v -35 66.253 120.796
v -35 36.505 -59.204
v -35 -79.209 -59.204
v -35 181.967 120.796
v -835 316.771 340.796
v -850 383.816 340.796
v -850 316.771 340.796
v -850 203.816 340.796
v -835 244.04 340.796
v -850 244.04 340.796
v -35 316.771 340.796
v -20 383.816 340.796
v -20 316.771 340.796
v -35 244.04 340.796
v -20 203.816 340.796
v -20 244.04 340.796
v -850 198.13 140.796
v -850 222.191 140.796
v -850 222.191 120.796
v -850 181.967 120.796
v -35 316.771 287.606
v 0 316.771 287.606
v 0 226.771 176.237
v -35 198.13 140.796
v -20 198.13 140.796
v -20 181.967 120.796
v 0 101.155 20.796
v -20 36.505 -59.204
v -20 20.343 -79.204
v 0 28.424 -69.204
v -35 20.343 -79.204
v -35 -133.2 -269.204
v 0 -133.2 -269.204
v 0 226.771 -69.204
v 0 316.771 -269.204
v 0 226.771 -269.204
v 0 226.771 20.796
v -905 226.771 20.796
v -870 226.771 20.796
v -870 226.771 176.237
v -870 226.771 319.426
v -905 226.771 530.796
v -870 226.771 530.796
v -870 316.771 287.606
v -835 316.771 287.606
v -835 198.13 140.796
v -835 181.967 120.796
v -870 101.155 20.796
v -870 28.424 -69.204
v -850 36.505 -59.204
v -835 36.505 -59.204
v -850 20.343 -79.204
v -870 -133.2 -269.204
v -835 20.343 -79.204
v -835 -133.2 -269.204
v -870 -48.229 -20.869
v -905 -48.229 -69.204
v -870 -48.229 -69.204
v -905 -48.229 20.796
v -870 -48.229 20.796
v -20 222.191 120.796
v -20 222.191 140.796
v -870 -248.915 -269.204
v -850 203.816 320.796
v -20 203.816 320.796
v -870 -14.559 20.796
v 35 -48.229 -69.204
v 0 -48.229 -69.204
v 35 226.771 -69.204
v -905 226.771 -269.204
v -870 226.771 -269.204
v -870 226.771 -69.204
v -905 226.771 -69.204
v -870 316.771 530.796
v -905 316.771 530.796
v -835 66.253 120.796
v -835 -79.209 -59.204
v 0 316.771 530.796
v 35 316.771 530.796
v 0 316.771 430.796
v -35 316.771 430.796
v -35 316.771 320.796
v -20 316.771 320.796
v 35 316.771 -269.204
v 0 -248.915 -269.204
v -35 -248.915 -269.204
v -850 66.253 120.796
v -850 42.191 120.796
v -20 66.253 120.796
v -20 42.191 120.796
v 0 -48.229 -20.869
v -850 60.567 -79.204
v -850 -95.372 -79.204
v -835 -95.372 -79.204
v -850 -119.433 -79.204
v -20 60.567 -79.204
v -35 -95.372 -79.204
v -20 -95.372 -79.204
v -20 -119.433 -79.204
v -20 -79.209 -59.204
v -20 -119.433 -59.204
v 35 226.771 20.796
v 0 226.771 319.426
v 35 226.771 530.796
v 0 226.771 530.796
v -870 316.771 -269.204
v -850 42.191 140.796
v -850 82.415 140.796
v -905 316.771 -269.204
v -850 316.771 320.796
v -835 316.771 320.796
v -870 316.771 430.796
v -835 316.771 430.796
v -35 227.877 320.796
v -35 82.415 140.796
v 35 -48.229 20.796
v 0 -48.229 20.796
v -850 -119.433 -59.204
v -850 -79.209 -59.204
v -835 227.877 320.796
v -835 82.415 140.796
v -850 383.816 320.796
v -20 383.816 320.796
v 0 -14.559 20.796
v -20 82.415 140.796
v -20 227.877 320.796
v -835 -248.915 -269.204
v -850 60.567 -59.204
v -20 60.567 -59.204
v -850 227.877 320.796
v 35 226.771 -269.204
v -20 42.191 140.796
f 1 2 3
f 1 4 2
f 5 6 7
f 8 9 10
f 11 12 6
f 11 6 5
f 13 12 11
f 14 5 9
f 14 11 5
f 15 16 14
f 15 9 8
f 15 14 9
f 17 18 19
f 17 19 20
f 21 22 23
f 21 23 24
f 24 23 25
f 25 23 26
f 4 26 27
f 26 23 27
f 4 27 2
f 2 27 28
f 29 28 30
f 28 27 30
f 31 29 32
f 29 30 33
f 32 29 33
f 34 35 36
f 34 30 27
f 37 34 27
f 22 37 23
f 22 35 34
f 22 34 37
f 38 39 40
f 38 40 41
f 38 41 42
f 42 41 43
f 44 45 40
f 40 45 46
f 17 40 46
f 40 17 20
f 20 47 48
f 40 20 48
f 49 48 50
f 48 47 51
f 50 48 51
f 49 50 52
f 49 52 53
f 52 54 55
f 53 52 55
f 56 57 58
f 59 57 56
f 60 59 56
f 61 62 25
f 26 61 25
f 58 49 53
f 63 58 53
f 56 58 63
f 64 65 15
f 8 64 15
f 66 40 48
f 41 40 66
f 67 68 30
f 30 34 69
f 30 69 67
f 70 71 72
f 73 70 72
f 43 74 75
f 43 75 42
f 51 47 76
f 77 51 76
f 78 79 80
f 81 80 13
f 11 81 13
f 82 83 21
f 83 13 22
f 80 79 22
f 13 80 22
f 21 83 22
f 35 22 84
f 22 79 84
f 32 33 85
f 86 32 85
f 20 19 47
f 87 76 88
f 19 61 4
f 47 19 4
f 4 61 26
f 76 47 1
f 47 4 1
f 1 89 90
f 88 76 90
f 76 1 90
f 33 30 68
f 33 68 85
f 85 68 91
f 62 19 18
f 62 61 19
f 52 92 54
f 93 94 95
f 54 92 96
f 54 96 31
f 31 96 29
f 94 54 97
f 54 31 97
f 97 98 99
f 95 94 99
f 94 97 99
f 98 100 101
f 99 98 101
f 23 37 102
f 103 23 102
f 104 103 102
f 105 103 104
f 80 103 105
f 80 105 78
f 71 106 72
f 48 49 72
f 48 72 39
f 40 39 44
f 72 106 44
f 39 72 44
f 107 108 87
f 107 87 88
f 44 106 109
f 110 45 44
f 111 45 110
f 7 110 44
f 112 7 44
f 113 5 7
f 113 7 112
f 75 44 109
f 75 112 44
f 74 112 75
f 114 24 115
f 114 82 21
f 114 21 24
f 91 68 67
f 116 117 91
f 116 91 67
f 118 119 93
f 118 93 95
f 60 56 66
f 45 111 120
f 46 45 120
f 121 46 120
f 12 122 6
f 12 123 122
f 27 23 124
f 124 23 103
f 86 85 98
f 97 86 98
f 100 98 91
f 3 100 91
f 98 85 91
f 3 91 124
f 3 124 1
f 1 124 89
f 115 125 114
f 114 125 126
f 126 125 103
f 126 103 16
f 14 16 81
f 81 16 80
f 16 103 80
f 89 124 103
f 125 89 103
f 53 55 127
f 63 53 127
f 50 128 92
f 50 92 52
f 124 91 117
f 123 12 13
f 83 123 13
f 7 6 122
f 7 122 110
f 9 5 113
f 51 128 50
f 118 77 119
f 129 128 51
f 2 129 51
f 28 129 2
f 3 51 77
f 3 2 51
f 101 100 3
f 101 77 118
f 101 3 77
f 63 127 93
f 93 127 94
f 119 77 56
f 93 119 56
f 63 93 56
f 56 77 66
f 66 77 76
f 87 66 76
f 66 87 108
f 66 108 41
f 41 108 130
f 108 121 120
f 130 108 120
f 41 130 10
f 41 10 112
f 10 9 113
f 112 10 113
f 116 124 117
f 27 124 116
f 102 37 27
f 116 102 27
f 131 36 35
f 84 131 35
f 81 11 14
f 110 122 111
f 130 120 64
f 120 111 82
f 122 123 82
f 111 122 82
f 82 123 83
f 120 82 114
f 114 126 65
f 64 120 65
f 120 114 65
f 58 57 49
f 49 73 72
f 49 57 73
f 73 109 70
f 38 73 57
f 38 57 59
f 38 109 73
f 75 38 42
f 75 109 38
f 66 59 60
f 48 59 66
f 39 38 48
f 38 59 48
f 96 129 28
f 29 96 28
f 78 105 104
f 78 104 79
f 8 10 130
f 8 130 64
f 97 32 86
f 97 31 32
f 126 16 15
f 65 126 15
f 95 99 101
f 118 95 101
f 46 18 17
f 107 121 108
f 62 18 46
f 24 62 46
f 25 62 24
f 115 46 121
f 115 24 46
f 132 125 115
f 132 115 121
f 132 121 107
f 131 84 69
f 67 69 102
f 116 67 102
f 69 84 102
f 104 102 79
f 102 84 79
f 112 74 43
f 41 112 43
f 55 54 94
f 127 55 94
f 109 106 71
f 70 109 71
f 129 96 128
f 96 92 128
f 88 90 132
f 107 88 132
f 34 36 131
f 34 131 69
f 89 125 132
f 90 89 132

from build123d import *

# Parameters (mm, degrees)
F0_W      = 90
F0_H      = 800
F1_DEPTH  = 35
F3_DEPTH  = 35
F5_W      = 180
F5_H      = 20
F6_DEPTH  = 800
F9_DEPTH  = 35
F10_W     = 90
F10_H     = 800
F11_DEPTH = 35
F12_W     = 35
F12_H     = 90
F13_DEPTH = 275
F4_W      = 35
F4_H      = 90
F14_DEPTH = 275
F15_DEPTH = 15
F16_DEPTH = 15
F17_DEPTH = 15
F18_DEPTH = 15
F19_DEPTH = 15
F20_DEPTH = 15


with BuildPart() as f1:
    # F0 (on Right) → F1 (new body)
    with BuildSketch(Plane.YZ):
        with Locations((271.7706648815, 130.7955920696)):
            Rectangle(F0_W, F0_H)
    extrude(amount=F1_DEPTH)

    # F2 (on face) → F3 (join)
    with BuildSketch(Plane(origin=(0, 0, 0), x_dir=(0, -1, 0), z_dir=(-1, 0, 0))):
        Polygon((248.9147600678, -269.2044079304), (-316.7706648815, 430.7955920696), (-316.7706648815, 287.6064688794), (-84.349539787, 0), (133.2004743535, -269.2044079304), align=None)
    extrude(amount=F3_DEPTH)

    # F5 (on face) → F6 (join)
    with BuildSketch(Plane(origin=(-35, 0, 0), x_dir=(0, -1, 0), z_dir=(-1, 0, 0))):
        with Locations((29.4332100823, -69.2044079304)):
            Rectangle(F5_W, F5_H)
        with Locations((-293.8156041744, 330.7955920696)):
            Rectangle(F5_W, F5_H)
        with Locations((-132.1911970461, 130.7955920696)):
            Rectangle(F5_W, F5_H)
    extrude(amount=F6_DEPTH)

    # F8 (on face) → F9 (join)
    with BuildSketch(Plane(origin=(-835, 0, 0), x_dir=(0, -1, 0), z_dir=(-1, 0, 0))):
        Polygon((-316.7706648815, 430.7955920696), (-316.7706648815, 287.6064688794), (133.2004743535, -269.2044079304), (248.9147600678, -269.2044079304), align=None)
    extrude(amount=F9_DEPTH)

    # F10 (on face) → F11 (join)
    with BuildSketch(Plane(origin=(-870, 0, 0), x_dir=(0, -1, 0), z_dir=(-1, 0, 0))):
        with Locations((-271.7706648815, 130.7955920696)):
            Rectangle(F10_W, F10_H)
    extrude(amount=F11_DEPTH)

    # F12 (on face) → F13 (join)
    with BuildSketch(Plane.XZ.offset(-226.7706648815)):
        with Locations((-887.5, -24.2044079304)):
            Rectangle(F12_W, F12_H)
    extrude(amount=F13_DEPTH)

    # F4 (on face) → F14 (join)
    with BuildSketch(Plane.XZ.offset(-226.7706648815)):
        with Locations((17.5, -24.2044079304)):
            Rectangle(F4_W, F4_H)
    extrude(amount=F14_DEPTH)

    # F5 (on face) → F15 (join)
    with BuildSketch(Plane(origin=(-35, 0, 0), x_dir=(0, -1, 0), z_dir=(-1, 0, 0))):
        with Locations((29.4332100823, -69.2044079304)):
            Rectangle(F5_W, F5_H)
        with Locations((-293.8156041744, 330.7955920696)):
            Rectangle(F5_W, F5_H)
        with Locations((-132.1911970461, 130.7955920696)):
            Rectangle(F5_W, F5_H)
    extrude(amount=-F15_DEPTH)

    # F16 (add): a face of the model
    f16_faces = [f1.faces().sort_by_distance(p)[0] for p in [
        (-835, 58.6012499561, 131.633644551),
    ]]
    extrude(f16_faces, amount=F16_DEPTH)

    # F17 (add): a face of the model
    f17_faces = [f1.faces().sort_by_distance(p)[0] for p in [
        (-835, 205.781144136, 129.9575395882),
    ]]
    extrude(f17_faces, amount=F17_DEPTH)

    # F18 (add): a face of the model
    f18_faces = [f1.faces().sort_by_distance(p)[0] for p in [
        (-835, 220.2256570845, 331.633644551),
    ]]
    extrude(f18_faces, amount=F18_DEPTH)

    # F19 (add): a face of the model
    f19_faces = [f1.faces().sort_by_distance(p)[0] for p in [
        (-835, 350.293134528, 330.7955920696),
    ]]
    extrude(f19_faces, amount=F19_DEPTH)

    # F20 (add): faces of the model
    f20_faces = [f1.faces().sort_by_distance(p)[0] for p in [
        (-835, -103.0231571722, -68.366355449),
        (-835, 44.1567370077, -70.0424604118),
    ]]
    extrude(f20_faces, amount=F20_DEPTH)


solid = f1.part
